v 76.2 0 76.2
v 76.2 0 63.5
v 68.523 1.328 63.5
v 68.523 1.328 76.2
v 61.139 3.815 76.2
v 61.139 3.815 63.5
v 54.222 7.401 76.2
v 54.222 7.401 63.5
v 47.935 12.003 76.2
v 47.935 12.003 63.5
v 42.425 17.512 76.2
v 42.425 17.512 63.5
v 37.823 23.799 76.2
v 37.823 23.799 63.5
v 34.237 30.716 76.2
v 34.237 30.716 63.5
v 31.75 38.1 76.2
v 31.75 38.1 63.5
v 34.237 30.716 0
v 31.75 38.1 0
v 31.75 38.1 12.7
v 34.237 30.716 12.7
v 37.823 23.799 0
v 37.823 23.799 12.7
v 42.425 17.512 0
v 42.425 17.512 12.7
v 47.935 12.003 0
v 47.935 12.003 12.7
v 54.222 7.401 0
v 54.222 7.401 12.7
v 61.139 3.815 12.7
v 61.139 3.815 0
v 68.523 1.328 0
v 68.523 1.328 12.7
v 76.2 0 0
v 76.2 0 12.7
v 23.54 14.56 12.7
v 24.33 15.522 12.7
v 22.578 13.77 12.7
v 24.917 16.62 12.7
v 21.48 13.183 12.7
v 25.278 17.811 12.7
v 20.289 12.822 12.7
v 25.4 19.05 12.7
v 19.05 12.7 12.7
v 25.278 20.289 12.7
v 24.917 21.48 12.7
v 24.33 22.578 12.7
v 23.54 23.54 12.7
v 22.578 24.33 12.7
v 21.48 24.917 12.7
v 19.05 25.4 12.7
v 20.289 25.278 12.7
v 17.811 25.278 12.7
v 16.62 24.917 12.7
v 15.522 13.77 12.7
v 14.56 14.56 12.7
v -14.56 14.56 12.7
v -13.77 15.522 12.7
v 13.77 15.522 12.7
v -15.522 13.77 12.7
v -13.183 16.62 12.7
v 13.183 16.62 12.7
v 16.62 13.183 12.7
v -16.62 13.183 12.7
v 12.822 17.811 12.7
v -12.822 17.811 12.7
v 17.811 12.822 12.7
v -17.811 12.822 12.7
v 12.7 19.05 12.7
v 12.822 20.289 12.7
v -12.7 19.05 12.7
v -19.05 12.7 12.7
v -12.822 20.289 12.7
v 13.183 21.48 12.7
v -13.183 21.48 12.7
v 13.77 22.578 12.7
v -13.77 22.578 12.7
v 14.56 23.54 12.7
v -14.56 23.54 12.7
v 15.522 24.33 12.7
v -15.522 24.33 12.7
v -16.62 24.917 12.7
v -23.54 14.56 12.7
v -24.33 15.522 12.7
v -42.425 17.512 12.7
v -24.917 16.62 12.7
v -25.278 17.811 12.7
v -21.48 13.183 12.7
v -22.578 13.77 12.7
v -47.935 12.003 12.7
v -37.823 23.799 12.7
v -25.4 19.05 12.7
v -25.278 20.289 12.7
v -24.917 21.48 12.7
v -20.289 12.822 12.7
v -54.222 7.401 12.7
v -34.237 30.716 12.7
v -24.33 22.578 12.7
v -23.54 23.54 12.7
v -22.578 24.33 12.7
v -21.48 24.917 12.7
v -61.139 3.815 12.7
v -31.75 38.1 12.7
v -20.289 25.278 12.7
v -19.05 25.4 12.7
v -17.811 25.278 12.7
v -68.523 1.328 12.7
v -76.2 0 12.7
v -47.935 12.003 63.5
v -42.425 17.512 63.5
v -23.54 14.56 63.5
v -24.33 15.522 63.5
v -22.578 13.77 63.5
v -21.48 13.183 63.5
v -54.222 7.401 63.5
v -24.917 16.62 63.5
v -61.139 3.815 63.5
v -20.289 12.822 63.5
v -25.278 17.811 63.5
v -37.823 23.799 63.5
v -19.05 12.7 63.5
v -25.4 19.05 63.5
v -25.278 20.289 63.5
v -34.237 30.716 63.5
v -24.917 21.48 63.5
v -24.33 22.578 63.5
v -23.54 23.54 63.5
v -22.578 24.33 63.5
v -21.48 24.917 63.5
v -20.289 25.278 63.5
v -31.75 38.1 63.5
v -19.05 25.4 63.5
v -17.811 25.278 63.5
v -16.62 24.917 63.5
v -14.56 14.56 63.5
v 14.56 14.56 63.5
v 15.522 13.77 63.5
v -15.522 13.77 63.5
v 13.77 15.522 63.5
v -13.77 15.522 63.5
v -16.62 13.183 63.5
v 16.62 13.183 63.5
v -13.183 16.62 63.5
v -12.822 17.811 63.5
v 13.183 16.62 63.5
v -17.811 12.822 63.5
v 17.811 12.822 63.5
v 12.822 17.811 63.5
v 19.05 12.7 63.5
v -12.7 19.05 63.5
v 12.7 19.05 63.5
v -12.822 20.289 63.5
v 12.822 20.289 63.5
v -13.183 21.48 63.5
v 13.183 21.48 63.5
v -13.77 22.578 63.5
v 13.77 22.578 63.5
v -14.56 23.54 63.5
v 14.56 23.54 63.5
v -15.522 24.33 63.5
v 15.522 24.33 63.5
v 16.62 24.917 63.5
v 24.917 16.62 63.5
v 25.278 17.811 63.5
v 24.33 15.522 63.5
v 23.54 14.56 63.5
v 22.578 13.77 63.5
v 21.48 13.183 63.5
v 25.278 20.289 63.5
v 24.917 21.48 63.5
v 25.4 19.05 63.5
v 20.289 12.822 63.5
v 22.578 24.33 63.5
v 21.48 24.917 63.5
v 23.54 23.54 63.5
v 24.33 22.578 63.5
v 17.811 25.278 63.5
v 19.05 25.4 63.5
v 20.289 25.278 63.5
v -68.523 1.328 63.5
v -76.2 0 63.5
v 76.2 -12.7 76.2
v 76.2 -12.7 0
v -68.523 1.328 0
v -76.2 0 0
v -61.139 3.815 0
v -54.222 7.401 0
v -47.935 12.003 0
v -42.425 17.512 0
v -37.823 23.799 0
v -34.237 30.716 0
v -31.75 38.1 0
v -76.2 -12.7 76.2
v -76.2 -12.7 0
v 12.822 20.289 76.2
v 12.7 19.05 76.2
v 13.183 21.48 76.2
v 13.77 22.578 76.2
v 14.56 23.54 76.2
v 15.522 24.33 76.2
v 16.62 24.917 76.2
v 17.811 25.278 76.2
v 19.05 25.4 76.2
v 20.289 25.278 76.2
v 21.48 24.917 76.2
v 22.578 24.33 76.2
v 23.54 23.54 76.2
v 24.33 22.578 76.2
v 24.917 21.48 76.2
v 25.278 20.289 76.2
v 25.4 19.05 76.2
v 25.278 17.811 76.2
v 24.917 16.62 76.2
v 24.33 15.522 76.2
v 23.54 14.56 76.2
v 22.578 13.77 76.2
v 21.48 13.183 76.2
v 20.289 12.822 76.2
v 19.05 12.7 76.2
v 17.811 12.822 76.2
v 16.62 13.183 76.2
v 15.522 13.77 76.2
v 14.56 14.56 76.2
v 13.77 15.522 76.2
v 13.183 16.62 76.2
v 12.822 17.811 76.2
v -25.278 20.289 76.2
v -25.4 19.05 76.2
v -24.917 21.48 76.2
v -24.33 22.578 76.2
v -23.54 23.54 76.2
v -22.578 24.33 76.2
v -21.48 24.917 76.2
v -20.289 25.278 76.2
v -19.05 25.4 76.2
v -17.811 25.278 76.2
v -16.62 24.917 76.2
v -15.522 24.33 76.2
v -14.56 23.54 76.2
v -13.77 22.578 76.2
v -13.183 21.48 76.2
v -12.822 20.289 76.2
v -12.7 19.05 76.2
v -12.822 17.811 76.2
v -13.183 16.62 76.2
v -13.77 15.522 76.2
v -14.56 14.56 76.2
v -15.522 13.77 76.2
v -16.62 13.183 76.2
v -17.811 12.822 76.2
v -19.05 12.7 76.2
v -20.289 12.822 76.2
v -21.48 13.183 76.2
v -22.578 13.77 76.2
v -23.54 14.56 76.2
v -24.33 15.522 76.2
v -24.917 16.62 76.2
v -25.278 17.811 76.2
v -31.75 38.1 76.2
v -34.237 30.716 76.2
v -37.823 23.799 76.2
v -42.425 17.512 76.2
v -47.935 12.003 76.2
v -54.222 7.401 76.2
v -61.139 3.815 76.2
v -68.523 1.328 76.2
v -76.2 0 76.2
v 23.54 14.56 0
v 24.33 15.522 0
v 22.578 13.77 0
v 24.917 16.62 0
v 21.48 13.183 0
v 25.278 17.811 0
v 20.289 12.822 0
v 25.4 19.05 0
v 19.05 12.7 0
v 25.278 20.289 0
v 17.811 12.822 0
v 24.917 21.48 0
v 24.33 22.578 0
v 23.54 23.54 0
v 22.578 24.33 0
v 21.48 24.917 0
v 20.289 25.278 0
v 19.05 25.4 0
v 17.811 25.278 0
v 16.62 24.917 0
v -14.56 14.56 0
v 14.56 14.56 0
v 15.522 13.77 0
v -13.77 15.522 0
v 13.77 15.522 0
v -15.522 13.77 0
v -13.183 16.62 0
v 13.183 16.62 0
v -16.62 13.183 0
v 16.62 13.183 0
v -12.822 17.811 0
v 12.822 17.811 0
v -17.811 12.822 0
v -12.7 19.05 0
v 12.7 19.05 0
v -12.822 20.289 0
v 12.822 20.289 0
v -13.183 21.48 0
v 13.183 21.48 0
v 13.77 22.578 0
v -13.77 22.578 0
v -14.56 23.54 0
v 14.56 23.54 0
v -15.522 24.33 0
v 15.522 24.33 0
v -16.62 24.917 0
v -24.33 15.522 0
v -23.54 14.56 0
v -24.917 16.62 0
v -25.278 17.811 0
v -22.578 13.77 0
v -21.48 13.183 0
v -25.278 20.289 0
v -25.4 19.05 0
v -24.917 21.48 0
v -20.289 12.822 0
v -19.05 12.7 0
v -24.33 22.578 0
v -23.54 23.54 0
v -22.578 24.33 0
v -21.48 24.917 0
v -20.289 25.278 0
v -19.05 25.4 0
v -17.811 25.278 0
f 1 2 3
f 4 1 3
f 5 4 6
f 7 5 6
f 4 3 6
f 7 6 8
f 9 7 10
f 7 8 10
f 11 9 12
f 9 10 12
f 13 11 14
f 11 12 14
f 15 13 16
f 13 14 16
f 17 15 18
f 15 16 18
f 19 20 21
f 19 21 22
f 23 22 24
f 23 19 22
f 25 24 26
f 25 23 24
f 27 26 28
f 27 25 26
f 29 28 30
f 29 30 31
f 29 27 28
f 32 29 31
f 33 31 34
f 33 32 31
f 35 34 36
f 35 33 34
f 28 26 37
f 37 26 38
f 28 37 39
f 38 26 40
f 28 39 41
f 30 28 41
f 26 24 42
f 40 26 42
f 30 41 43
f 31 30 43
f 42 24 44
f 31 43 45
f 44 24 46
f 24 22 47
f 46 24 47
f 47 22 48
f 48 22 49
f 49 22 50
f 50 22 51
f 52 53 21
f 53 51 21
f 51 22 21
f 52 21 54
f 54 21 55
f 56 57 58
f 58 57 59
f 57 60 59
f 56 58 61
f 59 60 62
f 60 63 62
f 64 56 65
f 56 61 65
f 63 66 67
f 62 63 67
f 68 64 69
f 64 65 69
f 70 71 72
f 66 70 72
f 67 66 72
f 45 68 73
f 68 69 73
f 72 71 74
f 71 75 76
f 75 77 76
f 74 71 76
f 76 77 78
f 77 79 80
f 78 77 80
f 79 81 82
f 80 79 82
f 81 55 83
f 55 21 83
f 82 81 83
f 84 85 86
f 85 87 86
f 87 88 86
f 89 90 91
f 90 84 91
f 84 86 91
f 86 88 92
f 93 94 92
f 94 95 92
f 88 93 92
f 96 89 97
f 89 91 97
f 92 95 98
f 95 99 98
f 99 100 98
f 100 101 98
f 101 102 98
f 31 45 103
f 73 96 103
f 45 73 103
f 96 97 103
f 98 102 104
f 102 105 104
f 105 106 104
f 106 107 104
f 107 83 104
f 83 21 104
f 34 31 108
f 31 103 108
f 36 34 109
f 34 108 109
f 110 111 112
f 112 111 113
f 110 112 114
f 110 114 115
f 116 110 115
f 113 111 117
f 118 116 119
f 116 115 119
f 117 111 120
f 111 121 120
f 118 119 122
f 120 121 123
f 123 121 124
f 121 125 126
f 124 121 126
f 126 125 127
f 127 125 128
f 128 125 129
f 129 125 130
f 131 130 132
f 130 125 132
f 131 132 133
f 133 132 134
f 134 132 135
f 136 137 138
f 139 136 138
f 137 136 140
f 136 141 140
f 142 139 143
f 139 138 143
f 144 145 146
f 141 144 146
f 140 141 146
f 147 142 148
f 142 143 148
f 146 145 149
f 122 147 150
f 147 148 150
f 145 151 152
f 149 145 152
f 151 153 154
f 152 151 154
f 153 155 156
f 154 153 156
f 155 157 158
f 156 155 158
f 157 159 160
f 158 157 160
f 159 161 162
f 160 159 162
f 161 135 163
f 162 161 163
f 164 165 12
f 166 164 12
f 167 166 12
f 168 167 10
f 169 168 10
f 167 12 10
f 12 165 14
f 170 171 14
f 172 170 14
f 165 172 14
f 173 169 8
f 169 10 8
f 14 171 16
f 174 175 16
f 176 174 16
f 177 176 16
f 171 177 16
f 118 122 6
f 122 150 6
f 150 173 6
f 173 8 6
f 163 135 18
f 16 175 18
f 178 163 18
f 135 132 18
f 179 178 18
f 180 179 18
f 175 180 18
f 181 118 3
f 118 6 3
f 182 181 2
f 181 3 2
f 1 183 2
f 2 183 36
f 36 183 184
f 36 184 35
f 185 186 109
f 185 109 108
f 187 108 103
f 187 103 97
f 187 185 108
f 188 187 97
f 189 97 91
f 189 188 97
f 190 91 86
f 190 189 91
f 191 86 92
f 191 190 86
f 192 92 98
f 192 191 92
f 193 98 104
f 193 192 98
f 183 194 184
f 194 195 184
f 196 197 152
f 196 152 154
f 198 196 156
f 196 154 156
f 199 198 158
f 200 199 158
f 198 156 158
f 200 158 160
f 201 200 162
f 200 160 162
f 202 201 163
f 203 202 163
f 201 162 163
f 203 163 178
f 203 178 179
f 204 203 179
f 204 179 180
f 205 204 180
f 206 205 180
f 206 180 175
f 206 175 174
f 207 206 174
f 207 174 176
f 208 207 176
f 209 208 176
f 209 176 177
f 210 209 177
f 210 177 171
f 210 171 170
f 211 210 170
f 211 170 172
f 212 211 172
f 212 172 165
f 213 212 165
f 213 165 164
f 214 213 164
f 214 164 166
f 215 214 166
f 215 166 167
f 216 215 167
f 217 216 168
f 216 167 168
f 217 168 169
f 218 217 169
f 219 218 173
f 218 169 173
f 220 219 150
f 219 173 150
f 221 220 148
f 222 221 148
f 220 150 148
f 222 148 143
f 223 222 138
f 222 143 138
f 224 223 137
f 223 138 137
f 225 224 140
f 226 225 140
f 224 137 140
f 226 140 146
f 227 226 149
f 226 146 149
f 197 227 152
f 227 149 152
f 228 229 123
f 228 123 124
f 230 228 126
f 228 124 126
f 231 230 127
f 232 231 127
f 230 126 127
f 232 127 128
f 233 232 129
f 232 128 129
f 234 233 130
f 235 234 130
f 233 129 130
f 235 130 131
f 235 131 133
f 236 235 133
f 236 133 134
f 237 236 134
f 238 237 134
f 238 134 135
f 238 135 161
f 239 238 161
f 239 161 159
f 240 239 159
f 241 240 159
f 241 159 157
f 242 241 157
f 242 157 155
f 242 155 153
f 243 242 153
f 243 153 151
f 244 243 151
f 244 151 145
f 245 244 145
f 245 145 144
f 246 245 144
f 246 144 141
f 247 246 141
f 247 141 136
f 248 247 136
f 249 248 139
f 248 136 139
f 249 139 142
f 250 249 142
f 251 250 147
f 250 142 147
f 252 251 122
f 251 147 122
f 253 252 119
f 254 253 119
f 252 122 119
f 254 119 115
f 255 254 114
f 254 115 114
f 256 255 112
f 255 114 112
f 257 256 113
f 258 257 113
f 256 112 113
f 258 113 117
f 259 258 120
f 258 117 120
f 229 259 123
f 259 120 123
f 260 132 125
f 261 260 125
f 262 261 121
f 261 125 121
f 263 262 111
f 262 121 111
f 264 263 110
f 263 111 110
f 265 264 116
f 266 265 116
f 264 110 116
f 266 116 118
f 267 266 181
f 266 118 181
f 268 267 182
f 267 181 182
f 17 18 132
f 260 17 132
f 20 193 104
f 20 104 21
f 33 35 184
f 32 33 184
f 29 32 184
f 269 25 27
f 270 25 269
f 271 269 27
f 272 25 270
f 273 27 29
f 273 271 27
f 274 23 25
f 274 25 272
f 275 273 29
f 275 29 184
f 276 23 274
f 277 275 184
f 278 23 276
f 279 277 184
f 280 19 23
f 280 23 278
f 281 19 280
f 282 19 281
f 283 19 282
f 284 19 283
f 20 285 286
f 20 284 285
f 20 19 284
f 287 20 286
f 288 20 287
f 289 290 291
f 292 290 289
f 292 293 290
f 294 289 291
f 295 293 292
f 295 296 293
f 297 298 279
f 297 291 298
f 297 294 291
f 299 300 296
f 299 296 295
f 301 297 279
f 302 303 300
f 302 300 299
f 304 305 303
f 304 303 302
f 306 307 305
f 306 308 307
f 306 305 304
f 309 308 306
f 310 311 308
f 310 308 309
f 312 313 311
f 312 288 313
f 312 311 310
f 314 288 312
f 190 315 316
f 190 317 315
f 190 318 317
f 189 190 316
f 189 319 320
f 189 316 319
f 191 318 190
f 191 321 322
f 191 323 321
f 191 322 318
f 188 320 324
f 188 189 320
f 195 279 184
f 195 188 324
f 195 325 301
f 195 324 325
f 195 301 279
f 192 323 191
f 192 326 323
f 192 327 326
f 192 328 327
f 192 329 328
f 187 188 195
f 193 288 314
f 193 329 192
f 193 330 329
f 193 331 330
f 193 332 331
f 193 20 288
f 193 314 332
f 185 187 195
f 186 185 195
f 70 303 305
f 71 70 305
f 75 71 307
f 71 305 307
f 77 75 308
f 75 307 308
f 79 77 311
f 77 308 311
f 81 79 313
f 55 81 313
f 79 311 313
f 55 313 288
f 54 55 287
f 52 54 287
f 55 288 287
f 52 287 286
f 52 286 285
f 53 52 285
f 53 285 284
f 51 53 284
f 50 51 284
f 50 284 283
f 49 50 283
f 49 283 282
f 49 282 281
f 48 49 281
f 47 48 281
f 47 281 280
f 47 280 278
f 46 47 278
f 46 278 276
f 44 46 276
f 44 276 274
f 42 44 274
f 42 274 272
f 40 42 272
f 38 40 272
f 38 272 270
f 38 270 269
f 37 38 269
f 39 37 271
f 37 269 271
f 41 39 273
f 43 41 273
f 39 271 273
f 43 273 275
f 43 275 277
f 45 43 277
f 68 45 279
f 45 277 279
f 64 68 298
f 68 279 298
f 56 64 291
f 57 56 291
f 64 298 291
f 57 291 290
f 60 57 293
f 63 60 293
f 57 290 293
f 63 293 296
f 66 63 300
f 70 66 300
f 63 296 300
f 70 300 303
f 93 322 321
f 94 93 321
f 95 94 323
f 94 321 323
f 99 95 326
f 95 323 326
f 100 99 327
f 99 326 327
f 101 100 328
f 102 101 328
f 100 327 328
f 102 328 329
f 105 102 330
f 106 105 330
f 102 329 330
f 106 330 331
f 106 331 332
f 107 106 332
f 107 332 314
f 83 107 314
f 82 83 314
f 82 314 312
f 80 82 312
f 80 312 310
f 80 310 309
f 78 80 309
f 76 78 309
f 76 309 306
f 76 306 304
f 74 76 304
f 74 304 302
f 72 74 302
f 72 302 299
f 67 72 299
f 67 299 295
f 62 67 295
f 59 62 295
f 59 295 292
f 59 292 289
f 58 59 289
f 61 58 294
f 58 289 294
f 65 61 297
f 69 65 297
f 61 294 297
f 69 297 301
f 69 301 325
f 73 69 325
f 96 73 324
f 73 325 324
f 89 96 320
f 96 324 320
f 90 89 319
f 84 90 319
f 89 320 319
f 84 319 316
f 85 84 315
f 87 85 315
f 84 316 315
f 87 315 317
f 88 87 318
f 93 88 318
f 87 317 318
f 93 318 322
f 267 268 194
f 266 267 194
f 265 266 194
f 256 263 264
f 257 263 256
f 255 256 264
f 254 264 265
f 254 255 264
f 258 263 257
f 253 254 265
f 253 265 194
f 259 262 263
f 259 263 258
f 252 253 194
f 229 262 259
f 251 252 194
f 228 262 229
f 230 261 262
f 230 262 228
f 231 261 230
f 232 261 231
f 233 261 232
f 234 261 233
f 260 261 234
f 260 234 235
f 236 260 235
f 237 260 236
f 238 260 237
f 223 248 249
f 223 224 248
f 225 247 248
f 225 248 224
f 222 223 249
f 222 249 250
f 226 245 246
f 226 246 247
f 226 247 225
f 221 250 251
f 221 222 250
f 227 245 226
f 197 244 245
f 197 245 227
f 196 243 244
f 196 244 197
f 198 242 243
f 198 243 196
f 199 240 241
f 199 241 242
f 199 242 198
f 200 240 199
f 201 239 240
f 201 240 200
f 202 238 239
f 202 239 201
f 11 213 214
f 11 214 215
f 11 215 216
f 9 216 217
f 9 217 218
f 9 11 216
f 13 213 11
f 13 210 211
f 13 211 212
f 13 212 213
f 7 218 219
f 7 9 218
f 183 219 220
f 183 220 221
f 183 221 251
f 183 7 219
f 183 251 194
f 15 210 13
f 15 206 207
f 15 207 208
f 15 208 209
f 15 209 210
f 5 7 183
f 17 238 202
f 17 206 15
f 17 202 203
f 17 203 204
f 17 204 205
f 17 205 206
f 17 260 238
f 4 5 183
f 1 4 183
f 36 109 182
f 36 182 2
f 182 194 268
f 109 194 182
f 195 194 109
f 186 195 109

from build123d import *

# Parameters (mm, degrees)
EXTRUDE1_DEPTH     = 12.7
SKETCH2_W          = 152.4
SKETCH2_H          = 12.7
EXTRUDE2_DEPTH     = 25.4
MIRROR1_START      = 38.1
MIRROR1_OUTLINE_W  = 152.4
MIRROR1_OUTLINE_H  = 12.7
MIRROR1_DEPTH      = 38.1
MIRROR1_START_2    = 63.5
MIRROR1_2_DEPTH    = 12.7
SKETCH4_R          = 6.35
CUT_EXTRUDE1_DEPTH = 115.3


# Read off the part's stored shape, not the designer's step: Mirror1
with BuildPart() as part:
    # Sketch1 → Extrude1 (new body)
    with BuildSketch(Plane.XY):
        with BuildLine():
            Line((-31.75, 38.1), (31.75, 38.1))
            ThreePointArc((31.75, 38.1), (47.934687961, 12.002969288), (76.2, 0))
            Line((76.2, 0), (76.2, -12.7))
            Line((76.2, -12.7), (-76.2, -12.7))
            Line((-76.2, -12.7), (-76.2, 0))
            ThreePointArc((-76.2, 0), (-47.934687961, 12.002969288), (-31.75, 38.1))
        make_face()
    extrude(amount=EXTRUDE1_DEPTH)

    # Sketch2 → Extrude2 (add)
    with BuildSketch(Plane.XY.offset(12.7)):
        with Locations((0, -6.35)):
            Rectangle(SKETCH2_W, SKETCH2_H)
    extrude(amount=EXTRUDE2_DEPTH)

    # Mirror1 outline → Mirror1 (add)
    with BuildSketch(Plane.XY.offset(MIRROR1_START)):
        with Locations((0, -6.35)):
            Rectangle(MIRROR1_OUTLINE_W, MIRROR1_OUTLINE_H)
    extrude(amount=MIRROR1_DEPTH)

    # Mirror1 2 outline → Mirror1 2 (add)
    with BuildSketch(Plane.XY.offset(MIRROR1_START_2)):
        with BuildLine():
            ThreePointArc((-31.75, 38.1), (-47.934687961, 12.002969288), (-76.2, 0))
            Line((-76.2, 0), (76.2, 0))
            ThreePointArc((76.2, 0), (47.934687961, 12.002969288), (31.75, 38.1))
            Line((31.75, 38.1), (-31.75, 38.1))
        make_face()
    extrude(amount=MIRROR1_2_DEPTH)

    # Sketch4 → Cut-Extrude1 (cut, through all)
    with BuildSketch(Plane(origin=(0, 0, 0), x_dir=(-1, 0, 0), z_dir=(0, 0, -1))):
        with Locations((-19.05, 19.05)):
            Circle(SKETCH4_R)
        with Locations((19.05, 19.05)):
            Circle(SKETCH4_R)
    extrude(amount=-CUT_EXTRUDE1_DEPTH, mode=Mode.SUBTRACT)


solid = part.part
